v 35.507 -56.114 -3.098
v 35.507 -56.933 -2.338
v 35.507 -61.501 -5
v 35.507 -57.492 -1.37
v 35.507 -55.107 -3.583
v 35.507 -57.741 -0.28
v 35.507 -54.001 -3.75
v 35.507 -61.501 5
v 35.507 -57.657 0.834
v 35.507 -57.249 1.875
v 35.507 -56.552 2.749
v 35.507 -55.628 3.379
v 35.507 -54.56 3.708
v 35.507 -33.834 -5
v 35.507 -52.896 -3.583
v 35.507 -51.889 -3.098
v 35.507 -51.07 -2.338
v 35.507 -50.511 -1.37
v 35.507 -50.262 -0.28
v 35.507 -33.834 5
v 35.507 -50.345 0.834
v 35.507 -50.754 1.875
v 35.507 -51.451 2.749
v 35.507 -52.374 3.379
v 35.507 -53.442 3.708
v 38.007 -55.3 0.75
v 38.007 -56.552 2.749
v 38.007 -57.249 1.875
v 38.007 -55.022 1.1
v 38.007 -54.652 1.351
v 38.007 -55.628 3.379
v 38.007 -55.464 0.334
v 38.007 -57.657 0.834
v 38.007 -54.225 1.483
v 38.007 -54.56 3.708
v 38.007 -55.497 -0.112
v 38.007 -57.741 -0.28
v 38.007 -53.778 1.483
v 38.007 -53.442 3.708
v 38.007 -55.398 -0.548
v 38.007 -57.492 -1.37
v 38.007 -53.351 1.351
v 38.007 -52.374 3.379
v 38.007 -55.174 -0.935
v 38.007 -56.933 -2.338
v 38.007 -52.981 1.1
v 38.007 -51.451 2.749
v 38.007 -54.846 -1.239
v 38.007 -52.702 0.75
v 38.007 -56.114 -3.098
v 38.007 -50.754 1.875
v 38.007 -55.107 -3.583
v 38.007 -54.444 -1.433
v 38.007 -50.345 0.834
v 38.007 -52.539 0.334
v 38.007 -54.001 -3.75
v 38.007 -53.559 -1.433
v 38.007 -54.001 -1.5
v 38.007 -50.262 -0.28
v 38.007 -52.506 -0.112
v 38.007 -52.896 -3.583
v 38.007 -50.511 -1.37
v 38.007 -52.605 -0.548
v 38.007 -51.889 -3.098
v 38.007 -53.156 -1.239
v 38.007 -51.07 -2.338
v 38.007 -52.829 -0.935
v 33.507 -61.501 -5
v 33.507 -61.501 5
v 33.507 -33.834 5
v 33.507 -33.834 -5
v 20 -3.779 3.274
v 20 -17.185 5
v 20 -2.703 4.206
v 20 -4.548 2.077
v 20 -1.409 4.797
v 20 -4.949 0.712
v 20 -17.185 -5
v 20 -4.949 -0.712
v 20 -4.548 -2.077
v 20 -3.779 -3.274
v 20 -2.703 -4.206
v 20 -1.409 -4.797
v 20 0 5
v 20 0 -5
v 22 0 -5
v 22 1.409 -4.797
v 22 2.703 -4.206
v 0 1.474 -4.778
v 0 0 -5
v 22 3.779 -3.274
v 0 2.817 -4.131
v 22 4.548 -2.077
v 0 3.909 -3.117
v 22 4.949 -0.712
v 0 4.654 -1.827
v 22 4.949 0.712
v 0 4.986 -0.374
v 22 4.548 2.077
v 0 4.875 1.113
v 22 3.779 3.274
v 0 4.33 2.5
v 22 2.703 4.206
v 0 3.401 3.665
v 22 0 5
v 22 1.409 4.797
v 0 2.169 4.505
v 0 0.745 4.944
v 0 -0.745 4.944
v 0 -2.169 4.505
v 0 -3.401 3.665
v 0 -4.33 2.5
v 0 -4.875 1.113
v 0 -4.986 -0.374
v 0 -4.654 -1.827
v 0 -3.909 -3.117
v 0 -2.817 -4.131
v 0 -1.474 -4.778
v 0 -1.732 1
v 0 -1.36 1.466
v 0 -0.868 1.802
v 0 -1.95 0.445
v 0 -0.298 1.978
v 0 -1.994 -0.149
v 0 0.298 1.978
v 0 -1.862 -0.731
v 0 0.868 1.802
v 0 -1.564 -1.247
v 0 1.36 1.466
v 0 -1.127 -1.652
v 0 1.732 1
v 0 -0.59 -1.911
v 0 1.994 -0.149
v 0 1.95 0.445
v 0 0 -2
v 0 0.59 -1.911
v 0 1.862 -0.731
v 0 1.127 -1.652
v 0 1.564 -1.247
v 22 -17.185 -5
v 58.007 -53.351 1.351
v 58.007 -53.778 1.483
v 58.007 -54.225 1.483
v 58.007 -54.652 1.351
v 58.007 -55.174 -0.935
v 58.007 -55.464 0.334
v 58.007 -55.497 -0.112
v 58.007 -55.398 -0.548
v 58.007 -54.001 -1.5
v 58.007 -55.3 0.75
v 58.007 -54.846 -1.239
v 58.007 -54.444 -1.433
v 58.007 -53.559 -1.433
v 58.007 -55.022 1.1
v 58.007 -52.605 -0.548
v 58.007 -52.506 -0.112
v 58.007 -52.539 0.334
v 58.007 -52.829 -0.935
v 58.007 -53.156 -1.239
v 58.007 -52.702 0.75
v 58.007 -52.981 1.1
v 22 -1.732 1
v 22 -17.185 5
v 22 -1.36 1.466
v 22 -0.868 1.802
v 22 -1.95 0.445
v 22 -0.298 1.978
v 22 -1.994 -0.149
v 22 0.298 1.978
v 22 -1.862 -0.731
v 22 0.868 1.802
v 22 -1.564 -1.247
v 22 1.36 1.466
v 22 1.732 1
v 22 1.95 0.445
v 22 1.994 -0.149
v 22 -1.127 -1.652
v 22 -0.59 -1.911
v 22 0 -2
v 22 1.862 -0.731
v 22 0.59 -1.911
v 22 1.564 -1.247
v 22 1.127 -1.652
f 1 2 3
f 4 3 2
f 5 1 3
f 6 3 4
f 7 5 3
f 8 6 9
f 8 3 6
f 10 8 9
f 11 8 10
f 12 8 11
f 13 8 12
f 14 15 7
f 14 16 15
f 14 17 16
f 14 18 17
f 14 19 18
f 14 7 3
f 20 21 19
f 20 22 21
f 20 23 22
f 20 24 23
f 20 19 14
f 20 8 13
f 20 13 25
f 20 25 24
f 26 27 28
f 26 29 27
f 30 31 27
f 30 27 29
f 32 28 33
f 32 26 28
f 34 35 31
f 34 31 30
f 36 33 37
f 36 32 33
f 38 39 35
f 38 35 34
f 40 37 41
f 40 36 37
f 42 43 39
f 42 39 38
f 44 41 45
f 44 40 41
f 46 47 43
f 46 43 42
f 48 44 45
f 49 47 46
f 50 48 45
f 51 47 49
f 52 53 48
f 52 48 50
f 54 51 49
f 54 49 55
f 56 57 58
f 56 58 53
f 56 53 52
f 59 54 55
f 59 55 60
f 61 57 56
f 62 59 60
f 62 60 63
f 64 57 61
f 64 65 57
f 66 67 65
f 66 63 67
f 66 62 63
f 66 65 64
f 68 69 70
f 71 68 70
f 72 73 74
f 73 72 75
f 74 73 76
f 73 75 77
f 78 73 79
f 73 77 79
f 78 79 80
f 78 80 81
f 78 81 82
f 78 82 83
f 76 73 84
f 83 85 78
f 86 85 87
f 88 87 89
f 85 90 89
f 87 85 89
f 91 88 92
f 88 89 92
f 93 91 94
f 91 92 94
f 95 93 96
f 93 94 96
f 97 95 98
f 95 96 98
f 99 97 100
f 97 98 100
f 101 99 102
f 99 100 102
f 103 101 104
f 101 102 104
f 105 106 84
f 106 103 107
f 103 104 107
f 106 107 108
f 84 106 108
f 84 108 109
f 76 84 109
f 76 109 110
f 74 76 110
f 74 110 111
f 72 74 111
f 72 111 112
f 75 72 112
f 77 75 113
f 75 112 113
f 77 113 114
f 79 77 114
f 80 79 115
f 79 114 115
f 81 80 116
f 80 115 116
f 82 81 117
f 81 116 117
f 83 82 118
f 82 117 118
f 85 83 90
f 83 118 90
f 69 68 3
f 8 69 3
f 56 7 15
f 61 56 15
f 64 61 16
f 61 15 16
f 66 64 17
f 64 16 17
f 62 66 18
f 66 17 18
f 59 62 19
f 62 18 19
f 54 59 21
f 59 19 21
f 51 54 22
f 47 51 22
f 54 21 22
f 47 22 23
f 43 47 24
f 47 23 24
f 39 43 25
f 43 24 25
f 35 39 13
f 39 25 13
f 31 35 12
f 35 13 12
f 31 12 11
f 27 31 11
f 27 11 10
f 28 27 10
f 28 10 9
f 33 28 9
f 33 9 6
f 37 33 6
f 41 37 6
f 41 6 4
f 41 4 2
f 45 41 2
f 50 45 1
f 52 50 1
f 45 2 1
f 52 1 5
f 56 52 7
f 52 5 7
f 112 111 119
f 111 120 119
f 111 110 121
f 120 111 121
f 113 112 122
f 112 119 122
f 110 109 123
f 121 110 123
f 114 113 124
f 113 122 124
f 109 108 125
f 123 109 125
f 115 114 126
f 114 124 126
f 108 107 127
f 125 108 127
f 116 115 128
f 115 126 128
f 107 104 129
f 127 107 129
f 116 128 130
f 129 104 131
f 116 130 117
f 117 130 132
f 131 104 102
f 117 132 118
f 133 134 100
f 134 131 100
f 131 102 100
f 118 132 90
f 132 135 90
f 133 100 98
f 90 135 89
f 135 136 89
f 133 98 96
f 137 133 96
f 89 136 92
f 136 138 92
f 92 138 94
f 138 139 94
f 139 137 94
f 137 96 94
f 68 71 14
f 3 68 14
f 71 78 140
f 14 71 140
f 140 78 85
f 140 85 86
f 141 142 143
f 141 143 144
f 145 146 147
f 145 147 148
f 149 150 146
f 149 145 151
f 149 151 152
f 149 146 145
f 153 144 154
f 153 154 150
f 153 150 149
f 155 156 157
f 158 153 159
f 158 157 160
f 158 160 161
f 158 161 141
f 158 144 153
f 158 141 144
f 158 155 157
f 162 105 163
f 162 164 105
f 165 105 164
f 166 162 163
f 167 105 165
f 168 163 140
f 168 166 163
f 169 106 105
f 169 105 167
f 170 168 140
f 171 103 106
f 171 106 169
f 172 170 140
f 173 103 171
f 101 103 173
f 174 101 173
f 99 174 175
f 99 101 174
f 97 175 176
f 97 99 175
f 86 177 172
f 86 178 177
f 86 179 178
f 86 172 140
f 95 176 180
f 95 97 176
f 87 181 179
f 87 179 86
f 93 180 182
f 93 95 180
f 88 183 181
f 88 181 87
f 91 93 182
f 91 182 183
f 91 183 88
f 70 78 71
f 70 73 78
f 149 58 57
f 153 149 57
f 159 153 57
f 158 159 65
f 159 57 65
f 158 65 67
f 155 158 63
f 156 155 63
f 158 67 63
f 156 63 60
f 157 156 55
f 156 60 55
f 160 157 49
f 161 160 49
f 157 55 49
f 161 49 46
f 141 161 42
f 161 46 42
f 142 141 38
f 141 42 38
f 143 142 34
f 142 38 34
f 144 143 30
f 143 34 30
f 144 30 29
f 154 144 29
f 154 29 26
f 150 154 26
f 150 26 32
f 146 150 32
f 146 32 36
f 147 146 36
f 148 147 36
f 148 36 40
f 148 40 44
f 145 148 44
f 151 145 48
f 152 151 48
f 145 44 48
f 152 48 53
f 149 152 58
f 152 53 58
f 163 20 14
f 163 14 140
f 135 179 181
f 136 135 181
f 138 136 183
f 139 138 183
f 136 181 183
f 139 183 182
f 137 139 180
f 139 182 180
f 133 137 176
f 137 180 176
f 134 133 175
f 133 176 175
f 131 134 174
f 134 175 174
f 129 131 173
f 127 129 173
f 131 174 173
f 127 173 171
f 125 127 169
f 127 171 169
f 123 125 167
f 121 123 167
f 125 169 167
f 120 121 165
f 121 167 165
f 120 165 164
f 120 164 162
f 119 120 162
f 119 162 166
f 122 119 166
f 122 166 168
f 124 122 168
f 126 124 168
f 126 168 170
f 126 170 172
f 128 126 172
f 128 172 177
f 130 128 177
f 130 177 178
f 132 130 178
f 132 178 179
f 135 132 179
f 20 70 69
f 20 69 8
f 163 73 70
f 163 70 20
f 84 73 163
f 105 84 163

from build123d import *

# Parameters (mm, degrees)
SKETCH1_R           = 5
BOSS_EXTRUDE1_DEPTH = 20
BOSS_EXTRUDE2_DEPTH = 2
SKETCH3_R           = 2
CUT_EXTRUDE1_DEPTH  = 23
BOSS_EXTRUDE3_DEPTH = 5
SKETCH5_W           = 2
SKETCH5_H           = 27.667167525
BOSS_EXTRUDE4_DEPTH = 5
SKETCH6_R           = 3.75
BOSS_EXTRUDE5_DEPTH = 2.5
SKETCH7_R           = 1.5
BOSS_EXTRUDE6_DEPTH = 20


with BuildPart() as part:
    # Sketch1 → Boss-Extrude1 (new body)
    with BuildSketch(Plane(origin=(0, 0, 0), x_dir=(0, 0, -1), z_dir=(1, 0, 0))):
        Circle(SKETCH1_R)
    extrude(amount=BOSS_EXTRUDE1_DEPTH)

    # Sketch2 → Boss-Extrude2 (add)
    with BuildSketch(Plane(origin=(20, 0, 0), x_dir=(0, 0, -1), z_dir=(1, 0, 0))):
        with BuildLine():
            Line((-5, 0), (-5, -17.185208198))
            Line((-5, -17.185208198), (5, -17.185208198))
            Line((5, -17.185208198), (5, 0))
            ThreePointArc((5, 0), (0, 5), (-5, 0))
        make_face()
    extrude(amount=BOSS_EXTRUDE2_DEPTH)

    # Sketch3 → Cut-Extrude1 (cut, through all)
    with BuildSketch(Plane(origin=(22, 0, 0), x_dir=(0, 0, -1), z_dir=(1, 0, 0))):
        Circle(SKETCH3_R)
    extrude(amount=-CUT_EXTRUDE1_DEPTH, mode=Mode.SUBTRACT)

    # Sketch4 → Boss-Extrude3 (add, symmetric)
    with BuildSketch(Plane.XY):
        Polygon((20, -17.185208198), (33.506911319, -33.834240512), (35.506911319, -33.834240512), (22, -17.185208198), align=None)
    extrude(amount=BOSS_EXTRUDE3_DEPTH, both=True)

    # Sketch5 → Boss-Extrude4 (add, symmetric)
    with BuildSketch(Plane.XY):
        with Locations((34.506911319, -47.667824275)):
            Rectangle(SKETCH5_W, SKETCH5_H)
    extrude(amount=BOSS_EXTRUDE4_DEPTH, both=True)

    # Sketch6 → Boss-Extrude5 (add)
    with BuildSketch(Plane(origin=(35.506911319, 0, 0), x_dir=(0, 0, -1), z_dir=(1, 0, 0))):
        with Locations((0, -54.001408037)):
            Circle(SKETCH6_R)
    extrude(amount=BOSS_EXTRUDE5_DEPTH)

    # Sketch7 → Boss-Extrude6 (add)
    with BuildSketch(Plane(origin=(38.006911319, 0, 0), x_dir=(0, 0, -1), z_dir=(1, 0, 0))):
        with Locations((0, -54.001408037)):
            Circle(SKETCH7_R)
    extrude(amount=BOSS_EXTRUDE6_DEPTH)


solid = part.part
